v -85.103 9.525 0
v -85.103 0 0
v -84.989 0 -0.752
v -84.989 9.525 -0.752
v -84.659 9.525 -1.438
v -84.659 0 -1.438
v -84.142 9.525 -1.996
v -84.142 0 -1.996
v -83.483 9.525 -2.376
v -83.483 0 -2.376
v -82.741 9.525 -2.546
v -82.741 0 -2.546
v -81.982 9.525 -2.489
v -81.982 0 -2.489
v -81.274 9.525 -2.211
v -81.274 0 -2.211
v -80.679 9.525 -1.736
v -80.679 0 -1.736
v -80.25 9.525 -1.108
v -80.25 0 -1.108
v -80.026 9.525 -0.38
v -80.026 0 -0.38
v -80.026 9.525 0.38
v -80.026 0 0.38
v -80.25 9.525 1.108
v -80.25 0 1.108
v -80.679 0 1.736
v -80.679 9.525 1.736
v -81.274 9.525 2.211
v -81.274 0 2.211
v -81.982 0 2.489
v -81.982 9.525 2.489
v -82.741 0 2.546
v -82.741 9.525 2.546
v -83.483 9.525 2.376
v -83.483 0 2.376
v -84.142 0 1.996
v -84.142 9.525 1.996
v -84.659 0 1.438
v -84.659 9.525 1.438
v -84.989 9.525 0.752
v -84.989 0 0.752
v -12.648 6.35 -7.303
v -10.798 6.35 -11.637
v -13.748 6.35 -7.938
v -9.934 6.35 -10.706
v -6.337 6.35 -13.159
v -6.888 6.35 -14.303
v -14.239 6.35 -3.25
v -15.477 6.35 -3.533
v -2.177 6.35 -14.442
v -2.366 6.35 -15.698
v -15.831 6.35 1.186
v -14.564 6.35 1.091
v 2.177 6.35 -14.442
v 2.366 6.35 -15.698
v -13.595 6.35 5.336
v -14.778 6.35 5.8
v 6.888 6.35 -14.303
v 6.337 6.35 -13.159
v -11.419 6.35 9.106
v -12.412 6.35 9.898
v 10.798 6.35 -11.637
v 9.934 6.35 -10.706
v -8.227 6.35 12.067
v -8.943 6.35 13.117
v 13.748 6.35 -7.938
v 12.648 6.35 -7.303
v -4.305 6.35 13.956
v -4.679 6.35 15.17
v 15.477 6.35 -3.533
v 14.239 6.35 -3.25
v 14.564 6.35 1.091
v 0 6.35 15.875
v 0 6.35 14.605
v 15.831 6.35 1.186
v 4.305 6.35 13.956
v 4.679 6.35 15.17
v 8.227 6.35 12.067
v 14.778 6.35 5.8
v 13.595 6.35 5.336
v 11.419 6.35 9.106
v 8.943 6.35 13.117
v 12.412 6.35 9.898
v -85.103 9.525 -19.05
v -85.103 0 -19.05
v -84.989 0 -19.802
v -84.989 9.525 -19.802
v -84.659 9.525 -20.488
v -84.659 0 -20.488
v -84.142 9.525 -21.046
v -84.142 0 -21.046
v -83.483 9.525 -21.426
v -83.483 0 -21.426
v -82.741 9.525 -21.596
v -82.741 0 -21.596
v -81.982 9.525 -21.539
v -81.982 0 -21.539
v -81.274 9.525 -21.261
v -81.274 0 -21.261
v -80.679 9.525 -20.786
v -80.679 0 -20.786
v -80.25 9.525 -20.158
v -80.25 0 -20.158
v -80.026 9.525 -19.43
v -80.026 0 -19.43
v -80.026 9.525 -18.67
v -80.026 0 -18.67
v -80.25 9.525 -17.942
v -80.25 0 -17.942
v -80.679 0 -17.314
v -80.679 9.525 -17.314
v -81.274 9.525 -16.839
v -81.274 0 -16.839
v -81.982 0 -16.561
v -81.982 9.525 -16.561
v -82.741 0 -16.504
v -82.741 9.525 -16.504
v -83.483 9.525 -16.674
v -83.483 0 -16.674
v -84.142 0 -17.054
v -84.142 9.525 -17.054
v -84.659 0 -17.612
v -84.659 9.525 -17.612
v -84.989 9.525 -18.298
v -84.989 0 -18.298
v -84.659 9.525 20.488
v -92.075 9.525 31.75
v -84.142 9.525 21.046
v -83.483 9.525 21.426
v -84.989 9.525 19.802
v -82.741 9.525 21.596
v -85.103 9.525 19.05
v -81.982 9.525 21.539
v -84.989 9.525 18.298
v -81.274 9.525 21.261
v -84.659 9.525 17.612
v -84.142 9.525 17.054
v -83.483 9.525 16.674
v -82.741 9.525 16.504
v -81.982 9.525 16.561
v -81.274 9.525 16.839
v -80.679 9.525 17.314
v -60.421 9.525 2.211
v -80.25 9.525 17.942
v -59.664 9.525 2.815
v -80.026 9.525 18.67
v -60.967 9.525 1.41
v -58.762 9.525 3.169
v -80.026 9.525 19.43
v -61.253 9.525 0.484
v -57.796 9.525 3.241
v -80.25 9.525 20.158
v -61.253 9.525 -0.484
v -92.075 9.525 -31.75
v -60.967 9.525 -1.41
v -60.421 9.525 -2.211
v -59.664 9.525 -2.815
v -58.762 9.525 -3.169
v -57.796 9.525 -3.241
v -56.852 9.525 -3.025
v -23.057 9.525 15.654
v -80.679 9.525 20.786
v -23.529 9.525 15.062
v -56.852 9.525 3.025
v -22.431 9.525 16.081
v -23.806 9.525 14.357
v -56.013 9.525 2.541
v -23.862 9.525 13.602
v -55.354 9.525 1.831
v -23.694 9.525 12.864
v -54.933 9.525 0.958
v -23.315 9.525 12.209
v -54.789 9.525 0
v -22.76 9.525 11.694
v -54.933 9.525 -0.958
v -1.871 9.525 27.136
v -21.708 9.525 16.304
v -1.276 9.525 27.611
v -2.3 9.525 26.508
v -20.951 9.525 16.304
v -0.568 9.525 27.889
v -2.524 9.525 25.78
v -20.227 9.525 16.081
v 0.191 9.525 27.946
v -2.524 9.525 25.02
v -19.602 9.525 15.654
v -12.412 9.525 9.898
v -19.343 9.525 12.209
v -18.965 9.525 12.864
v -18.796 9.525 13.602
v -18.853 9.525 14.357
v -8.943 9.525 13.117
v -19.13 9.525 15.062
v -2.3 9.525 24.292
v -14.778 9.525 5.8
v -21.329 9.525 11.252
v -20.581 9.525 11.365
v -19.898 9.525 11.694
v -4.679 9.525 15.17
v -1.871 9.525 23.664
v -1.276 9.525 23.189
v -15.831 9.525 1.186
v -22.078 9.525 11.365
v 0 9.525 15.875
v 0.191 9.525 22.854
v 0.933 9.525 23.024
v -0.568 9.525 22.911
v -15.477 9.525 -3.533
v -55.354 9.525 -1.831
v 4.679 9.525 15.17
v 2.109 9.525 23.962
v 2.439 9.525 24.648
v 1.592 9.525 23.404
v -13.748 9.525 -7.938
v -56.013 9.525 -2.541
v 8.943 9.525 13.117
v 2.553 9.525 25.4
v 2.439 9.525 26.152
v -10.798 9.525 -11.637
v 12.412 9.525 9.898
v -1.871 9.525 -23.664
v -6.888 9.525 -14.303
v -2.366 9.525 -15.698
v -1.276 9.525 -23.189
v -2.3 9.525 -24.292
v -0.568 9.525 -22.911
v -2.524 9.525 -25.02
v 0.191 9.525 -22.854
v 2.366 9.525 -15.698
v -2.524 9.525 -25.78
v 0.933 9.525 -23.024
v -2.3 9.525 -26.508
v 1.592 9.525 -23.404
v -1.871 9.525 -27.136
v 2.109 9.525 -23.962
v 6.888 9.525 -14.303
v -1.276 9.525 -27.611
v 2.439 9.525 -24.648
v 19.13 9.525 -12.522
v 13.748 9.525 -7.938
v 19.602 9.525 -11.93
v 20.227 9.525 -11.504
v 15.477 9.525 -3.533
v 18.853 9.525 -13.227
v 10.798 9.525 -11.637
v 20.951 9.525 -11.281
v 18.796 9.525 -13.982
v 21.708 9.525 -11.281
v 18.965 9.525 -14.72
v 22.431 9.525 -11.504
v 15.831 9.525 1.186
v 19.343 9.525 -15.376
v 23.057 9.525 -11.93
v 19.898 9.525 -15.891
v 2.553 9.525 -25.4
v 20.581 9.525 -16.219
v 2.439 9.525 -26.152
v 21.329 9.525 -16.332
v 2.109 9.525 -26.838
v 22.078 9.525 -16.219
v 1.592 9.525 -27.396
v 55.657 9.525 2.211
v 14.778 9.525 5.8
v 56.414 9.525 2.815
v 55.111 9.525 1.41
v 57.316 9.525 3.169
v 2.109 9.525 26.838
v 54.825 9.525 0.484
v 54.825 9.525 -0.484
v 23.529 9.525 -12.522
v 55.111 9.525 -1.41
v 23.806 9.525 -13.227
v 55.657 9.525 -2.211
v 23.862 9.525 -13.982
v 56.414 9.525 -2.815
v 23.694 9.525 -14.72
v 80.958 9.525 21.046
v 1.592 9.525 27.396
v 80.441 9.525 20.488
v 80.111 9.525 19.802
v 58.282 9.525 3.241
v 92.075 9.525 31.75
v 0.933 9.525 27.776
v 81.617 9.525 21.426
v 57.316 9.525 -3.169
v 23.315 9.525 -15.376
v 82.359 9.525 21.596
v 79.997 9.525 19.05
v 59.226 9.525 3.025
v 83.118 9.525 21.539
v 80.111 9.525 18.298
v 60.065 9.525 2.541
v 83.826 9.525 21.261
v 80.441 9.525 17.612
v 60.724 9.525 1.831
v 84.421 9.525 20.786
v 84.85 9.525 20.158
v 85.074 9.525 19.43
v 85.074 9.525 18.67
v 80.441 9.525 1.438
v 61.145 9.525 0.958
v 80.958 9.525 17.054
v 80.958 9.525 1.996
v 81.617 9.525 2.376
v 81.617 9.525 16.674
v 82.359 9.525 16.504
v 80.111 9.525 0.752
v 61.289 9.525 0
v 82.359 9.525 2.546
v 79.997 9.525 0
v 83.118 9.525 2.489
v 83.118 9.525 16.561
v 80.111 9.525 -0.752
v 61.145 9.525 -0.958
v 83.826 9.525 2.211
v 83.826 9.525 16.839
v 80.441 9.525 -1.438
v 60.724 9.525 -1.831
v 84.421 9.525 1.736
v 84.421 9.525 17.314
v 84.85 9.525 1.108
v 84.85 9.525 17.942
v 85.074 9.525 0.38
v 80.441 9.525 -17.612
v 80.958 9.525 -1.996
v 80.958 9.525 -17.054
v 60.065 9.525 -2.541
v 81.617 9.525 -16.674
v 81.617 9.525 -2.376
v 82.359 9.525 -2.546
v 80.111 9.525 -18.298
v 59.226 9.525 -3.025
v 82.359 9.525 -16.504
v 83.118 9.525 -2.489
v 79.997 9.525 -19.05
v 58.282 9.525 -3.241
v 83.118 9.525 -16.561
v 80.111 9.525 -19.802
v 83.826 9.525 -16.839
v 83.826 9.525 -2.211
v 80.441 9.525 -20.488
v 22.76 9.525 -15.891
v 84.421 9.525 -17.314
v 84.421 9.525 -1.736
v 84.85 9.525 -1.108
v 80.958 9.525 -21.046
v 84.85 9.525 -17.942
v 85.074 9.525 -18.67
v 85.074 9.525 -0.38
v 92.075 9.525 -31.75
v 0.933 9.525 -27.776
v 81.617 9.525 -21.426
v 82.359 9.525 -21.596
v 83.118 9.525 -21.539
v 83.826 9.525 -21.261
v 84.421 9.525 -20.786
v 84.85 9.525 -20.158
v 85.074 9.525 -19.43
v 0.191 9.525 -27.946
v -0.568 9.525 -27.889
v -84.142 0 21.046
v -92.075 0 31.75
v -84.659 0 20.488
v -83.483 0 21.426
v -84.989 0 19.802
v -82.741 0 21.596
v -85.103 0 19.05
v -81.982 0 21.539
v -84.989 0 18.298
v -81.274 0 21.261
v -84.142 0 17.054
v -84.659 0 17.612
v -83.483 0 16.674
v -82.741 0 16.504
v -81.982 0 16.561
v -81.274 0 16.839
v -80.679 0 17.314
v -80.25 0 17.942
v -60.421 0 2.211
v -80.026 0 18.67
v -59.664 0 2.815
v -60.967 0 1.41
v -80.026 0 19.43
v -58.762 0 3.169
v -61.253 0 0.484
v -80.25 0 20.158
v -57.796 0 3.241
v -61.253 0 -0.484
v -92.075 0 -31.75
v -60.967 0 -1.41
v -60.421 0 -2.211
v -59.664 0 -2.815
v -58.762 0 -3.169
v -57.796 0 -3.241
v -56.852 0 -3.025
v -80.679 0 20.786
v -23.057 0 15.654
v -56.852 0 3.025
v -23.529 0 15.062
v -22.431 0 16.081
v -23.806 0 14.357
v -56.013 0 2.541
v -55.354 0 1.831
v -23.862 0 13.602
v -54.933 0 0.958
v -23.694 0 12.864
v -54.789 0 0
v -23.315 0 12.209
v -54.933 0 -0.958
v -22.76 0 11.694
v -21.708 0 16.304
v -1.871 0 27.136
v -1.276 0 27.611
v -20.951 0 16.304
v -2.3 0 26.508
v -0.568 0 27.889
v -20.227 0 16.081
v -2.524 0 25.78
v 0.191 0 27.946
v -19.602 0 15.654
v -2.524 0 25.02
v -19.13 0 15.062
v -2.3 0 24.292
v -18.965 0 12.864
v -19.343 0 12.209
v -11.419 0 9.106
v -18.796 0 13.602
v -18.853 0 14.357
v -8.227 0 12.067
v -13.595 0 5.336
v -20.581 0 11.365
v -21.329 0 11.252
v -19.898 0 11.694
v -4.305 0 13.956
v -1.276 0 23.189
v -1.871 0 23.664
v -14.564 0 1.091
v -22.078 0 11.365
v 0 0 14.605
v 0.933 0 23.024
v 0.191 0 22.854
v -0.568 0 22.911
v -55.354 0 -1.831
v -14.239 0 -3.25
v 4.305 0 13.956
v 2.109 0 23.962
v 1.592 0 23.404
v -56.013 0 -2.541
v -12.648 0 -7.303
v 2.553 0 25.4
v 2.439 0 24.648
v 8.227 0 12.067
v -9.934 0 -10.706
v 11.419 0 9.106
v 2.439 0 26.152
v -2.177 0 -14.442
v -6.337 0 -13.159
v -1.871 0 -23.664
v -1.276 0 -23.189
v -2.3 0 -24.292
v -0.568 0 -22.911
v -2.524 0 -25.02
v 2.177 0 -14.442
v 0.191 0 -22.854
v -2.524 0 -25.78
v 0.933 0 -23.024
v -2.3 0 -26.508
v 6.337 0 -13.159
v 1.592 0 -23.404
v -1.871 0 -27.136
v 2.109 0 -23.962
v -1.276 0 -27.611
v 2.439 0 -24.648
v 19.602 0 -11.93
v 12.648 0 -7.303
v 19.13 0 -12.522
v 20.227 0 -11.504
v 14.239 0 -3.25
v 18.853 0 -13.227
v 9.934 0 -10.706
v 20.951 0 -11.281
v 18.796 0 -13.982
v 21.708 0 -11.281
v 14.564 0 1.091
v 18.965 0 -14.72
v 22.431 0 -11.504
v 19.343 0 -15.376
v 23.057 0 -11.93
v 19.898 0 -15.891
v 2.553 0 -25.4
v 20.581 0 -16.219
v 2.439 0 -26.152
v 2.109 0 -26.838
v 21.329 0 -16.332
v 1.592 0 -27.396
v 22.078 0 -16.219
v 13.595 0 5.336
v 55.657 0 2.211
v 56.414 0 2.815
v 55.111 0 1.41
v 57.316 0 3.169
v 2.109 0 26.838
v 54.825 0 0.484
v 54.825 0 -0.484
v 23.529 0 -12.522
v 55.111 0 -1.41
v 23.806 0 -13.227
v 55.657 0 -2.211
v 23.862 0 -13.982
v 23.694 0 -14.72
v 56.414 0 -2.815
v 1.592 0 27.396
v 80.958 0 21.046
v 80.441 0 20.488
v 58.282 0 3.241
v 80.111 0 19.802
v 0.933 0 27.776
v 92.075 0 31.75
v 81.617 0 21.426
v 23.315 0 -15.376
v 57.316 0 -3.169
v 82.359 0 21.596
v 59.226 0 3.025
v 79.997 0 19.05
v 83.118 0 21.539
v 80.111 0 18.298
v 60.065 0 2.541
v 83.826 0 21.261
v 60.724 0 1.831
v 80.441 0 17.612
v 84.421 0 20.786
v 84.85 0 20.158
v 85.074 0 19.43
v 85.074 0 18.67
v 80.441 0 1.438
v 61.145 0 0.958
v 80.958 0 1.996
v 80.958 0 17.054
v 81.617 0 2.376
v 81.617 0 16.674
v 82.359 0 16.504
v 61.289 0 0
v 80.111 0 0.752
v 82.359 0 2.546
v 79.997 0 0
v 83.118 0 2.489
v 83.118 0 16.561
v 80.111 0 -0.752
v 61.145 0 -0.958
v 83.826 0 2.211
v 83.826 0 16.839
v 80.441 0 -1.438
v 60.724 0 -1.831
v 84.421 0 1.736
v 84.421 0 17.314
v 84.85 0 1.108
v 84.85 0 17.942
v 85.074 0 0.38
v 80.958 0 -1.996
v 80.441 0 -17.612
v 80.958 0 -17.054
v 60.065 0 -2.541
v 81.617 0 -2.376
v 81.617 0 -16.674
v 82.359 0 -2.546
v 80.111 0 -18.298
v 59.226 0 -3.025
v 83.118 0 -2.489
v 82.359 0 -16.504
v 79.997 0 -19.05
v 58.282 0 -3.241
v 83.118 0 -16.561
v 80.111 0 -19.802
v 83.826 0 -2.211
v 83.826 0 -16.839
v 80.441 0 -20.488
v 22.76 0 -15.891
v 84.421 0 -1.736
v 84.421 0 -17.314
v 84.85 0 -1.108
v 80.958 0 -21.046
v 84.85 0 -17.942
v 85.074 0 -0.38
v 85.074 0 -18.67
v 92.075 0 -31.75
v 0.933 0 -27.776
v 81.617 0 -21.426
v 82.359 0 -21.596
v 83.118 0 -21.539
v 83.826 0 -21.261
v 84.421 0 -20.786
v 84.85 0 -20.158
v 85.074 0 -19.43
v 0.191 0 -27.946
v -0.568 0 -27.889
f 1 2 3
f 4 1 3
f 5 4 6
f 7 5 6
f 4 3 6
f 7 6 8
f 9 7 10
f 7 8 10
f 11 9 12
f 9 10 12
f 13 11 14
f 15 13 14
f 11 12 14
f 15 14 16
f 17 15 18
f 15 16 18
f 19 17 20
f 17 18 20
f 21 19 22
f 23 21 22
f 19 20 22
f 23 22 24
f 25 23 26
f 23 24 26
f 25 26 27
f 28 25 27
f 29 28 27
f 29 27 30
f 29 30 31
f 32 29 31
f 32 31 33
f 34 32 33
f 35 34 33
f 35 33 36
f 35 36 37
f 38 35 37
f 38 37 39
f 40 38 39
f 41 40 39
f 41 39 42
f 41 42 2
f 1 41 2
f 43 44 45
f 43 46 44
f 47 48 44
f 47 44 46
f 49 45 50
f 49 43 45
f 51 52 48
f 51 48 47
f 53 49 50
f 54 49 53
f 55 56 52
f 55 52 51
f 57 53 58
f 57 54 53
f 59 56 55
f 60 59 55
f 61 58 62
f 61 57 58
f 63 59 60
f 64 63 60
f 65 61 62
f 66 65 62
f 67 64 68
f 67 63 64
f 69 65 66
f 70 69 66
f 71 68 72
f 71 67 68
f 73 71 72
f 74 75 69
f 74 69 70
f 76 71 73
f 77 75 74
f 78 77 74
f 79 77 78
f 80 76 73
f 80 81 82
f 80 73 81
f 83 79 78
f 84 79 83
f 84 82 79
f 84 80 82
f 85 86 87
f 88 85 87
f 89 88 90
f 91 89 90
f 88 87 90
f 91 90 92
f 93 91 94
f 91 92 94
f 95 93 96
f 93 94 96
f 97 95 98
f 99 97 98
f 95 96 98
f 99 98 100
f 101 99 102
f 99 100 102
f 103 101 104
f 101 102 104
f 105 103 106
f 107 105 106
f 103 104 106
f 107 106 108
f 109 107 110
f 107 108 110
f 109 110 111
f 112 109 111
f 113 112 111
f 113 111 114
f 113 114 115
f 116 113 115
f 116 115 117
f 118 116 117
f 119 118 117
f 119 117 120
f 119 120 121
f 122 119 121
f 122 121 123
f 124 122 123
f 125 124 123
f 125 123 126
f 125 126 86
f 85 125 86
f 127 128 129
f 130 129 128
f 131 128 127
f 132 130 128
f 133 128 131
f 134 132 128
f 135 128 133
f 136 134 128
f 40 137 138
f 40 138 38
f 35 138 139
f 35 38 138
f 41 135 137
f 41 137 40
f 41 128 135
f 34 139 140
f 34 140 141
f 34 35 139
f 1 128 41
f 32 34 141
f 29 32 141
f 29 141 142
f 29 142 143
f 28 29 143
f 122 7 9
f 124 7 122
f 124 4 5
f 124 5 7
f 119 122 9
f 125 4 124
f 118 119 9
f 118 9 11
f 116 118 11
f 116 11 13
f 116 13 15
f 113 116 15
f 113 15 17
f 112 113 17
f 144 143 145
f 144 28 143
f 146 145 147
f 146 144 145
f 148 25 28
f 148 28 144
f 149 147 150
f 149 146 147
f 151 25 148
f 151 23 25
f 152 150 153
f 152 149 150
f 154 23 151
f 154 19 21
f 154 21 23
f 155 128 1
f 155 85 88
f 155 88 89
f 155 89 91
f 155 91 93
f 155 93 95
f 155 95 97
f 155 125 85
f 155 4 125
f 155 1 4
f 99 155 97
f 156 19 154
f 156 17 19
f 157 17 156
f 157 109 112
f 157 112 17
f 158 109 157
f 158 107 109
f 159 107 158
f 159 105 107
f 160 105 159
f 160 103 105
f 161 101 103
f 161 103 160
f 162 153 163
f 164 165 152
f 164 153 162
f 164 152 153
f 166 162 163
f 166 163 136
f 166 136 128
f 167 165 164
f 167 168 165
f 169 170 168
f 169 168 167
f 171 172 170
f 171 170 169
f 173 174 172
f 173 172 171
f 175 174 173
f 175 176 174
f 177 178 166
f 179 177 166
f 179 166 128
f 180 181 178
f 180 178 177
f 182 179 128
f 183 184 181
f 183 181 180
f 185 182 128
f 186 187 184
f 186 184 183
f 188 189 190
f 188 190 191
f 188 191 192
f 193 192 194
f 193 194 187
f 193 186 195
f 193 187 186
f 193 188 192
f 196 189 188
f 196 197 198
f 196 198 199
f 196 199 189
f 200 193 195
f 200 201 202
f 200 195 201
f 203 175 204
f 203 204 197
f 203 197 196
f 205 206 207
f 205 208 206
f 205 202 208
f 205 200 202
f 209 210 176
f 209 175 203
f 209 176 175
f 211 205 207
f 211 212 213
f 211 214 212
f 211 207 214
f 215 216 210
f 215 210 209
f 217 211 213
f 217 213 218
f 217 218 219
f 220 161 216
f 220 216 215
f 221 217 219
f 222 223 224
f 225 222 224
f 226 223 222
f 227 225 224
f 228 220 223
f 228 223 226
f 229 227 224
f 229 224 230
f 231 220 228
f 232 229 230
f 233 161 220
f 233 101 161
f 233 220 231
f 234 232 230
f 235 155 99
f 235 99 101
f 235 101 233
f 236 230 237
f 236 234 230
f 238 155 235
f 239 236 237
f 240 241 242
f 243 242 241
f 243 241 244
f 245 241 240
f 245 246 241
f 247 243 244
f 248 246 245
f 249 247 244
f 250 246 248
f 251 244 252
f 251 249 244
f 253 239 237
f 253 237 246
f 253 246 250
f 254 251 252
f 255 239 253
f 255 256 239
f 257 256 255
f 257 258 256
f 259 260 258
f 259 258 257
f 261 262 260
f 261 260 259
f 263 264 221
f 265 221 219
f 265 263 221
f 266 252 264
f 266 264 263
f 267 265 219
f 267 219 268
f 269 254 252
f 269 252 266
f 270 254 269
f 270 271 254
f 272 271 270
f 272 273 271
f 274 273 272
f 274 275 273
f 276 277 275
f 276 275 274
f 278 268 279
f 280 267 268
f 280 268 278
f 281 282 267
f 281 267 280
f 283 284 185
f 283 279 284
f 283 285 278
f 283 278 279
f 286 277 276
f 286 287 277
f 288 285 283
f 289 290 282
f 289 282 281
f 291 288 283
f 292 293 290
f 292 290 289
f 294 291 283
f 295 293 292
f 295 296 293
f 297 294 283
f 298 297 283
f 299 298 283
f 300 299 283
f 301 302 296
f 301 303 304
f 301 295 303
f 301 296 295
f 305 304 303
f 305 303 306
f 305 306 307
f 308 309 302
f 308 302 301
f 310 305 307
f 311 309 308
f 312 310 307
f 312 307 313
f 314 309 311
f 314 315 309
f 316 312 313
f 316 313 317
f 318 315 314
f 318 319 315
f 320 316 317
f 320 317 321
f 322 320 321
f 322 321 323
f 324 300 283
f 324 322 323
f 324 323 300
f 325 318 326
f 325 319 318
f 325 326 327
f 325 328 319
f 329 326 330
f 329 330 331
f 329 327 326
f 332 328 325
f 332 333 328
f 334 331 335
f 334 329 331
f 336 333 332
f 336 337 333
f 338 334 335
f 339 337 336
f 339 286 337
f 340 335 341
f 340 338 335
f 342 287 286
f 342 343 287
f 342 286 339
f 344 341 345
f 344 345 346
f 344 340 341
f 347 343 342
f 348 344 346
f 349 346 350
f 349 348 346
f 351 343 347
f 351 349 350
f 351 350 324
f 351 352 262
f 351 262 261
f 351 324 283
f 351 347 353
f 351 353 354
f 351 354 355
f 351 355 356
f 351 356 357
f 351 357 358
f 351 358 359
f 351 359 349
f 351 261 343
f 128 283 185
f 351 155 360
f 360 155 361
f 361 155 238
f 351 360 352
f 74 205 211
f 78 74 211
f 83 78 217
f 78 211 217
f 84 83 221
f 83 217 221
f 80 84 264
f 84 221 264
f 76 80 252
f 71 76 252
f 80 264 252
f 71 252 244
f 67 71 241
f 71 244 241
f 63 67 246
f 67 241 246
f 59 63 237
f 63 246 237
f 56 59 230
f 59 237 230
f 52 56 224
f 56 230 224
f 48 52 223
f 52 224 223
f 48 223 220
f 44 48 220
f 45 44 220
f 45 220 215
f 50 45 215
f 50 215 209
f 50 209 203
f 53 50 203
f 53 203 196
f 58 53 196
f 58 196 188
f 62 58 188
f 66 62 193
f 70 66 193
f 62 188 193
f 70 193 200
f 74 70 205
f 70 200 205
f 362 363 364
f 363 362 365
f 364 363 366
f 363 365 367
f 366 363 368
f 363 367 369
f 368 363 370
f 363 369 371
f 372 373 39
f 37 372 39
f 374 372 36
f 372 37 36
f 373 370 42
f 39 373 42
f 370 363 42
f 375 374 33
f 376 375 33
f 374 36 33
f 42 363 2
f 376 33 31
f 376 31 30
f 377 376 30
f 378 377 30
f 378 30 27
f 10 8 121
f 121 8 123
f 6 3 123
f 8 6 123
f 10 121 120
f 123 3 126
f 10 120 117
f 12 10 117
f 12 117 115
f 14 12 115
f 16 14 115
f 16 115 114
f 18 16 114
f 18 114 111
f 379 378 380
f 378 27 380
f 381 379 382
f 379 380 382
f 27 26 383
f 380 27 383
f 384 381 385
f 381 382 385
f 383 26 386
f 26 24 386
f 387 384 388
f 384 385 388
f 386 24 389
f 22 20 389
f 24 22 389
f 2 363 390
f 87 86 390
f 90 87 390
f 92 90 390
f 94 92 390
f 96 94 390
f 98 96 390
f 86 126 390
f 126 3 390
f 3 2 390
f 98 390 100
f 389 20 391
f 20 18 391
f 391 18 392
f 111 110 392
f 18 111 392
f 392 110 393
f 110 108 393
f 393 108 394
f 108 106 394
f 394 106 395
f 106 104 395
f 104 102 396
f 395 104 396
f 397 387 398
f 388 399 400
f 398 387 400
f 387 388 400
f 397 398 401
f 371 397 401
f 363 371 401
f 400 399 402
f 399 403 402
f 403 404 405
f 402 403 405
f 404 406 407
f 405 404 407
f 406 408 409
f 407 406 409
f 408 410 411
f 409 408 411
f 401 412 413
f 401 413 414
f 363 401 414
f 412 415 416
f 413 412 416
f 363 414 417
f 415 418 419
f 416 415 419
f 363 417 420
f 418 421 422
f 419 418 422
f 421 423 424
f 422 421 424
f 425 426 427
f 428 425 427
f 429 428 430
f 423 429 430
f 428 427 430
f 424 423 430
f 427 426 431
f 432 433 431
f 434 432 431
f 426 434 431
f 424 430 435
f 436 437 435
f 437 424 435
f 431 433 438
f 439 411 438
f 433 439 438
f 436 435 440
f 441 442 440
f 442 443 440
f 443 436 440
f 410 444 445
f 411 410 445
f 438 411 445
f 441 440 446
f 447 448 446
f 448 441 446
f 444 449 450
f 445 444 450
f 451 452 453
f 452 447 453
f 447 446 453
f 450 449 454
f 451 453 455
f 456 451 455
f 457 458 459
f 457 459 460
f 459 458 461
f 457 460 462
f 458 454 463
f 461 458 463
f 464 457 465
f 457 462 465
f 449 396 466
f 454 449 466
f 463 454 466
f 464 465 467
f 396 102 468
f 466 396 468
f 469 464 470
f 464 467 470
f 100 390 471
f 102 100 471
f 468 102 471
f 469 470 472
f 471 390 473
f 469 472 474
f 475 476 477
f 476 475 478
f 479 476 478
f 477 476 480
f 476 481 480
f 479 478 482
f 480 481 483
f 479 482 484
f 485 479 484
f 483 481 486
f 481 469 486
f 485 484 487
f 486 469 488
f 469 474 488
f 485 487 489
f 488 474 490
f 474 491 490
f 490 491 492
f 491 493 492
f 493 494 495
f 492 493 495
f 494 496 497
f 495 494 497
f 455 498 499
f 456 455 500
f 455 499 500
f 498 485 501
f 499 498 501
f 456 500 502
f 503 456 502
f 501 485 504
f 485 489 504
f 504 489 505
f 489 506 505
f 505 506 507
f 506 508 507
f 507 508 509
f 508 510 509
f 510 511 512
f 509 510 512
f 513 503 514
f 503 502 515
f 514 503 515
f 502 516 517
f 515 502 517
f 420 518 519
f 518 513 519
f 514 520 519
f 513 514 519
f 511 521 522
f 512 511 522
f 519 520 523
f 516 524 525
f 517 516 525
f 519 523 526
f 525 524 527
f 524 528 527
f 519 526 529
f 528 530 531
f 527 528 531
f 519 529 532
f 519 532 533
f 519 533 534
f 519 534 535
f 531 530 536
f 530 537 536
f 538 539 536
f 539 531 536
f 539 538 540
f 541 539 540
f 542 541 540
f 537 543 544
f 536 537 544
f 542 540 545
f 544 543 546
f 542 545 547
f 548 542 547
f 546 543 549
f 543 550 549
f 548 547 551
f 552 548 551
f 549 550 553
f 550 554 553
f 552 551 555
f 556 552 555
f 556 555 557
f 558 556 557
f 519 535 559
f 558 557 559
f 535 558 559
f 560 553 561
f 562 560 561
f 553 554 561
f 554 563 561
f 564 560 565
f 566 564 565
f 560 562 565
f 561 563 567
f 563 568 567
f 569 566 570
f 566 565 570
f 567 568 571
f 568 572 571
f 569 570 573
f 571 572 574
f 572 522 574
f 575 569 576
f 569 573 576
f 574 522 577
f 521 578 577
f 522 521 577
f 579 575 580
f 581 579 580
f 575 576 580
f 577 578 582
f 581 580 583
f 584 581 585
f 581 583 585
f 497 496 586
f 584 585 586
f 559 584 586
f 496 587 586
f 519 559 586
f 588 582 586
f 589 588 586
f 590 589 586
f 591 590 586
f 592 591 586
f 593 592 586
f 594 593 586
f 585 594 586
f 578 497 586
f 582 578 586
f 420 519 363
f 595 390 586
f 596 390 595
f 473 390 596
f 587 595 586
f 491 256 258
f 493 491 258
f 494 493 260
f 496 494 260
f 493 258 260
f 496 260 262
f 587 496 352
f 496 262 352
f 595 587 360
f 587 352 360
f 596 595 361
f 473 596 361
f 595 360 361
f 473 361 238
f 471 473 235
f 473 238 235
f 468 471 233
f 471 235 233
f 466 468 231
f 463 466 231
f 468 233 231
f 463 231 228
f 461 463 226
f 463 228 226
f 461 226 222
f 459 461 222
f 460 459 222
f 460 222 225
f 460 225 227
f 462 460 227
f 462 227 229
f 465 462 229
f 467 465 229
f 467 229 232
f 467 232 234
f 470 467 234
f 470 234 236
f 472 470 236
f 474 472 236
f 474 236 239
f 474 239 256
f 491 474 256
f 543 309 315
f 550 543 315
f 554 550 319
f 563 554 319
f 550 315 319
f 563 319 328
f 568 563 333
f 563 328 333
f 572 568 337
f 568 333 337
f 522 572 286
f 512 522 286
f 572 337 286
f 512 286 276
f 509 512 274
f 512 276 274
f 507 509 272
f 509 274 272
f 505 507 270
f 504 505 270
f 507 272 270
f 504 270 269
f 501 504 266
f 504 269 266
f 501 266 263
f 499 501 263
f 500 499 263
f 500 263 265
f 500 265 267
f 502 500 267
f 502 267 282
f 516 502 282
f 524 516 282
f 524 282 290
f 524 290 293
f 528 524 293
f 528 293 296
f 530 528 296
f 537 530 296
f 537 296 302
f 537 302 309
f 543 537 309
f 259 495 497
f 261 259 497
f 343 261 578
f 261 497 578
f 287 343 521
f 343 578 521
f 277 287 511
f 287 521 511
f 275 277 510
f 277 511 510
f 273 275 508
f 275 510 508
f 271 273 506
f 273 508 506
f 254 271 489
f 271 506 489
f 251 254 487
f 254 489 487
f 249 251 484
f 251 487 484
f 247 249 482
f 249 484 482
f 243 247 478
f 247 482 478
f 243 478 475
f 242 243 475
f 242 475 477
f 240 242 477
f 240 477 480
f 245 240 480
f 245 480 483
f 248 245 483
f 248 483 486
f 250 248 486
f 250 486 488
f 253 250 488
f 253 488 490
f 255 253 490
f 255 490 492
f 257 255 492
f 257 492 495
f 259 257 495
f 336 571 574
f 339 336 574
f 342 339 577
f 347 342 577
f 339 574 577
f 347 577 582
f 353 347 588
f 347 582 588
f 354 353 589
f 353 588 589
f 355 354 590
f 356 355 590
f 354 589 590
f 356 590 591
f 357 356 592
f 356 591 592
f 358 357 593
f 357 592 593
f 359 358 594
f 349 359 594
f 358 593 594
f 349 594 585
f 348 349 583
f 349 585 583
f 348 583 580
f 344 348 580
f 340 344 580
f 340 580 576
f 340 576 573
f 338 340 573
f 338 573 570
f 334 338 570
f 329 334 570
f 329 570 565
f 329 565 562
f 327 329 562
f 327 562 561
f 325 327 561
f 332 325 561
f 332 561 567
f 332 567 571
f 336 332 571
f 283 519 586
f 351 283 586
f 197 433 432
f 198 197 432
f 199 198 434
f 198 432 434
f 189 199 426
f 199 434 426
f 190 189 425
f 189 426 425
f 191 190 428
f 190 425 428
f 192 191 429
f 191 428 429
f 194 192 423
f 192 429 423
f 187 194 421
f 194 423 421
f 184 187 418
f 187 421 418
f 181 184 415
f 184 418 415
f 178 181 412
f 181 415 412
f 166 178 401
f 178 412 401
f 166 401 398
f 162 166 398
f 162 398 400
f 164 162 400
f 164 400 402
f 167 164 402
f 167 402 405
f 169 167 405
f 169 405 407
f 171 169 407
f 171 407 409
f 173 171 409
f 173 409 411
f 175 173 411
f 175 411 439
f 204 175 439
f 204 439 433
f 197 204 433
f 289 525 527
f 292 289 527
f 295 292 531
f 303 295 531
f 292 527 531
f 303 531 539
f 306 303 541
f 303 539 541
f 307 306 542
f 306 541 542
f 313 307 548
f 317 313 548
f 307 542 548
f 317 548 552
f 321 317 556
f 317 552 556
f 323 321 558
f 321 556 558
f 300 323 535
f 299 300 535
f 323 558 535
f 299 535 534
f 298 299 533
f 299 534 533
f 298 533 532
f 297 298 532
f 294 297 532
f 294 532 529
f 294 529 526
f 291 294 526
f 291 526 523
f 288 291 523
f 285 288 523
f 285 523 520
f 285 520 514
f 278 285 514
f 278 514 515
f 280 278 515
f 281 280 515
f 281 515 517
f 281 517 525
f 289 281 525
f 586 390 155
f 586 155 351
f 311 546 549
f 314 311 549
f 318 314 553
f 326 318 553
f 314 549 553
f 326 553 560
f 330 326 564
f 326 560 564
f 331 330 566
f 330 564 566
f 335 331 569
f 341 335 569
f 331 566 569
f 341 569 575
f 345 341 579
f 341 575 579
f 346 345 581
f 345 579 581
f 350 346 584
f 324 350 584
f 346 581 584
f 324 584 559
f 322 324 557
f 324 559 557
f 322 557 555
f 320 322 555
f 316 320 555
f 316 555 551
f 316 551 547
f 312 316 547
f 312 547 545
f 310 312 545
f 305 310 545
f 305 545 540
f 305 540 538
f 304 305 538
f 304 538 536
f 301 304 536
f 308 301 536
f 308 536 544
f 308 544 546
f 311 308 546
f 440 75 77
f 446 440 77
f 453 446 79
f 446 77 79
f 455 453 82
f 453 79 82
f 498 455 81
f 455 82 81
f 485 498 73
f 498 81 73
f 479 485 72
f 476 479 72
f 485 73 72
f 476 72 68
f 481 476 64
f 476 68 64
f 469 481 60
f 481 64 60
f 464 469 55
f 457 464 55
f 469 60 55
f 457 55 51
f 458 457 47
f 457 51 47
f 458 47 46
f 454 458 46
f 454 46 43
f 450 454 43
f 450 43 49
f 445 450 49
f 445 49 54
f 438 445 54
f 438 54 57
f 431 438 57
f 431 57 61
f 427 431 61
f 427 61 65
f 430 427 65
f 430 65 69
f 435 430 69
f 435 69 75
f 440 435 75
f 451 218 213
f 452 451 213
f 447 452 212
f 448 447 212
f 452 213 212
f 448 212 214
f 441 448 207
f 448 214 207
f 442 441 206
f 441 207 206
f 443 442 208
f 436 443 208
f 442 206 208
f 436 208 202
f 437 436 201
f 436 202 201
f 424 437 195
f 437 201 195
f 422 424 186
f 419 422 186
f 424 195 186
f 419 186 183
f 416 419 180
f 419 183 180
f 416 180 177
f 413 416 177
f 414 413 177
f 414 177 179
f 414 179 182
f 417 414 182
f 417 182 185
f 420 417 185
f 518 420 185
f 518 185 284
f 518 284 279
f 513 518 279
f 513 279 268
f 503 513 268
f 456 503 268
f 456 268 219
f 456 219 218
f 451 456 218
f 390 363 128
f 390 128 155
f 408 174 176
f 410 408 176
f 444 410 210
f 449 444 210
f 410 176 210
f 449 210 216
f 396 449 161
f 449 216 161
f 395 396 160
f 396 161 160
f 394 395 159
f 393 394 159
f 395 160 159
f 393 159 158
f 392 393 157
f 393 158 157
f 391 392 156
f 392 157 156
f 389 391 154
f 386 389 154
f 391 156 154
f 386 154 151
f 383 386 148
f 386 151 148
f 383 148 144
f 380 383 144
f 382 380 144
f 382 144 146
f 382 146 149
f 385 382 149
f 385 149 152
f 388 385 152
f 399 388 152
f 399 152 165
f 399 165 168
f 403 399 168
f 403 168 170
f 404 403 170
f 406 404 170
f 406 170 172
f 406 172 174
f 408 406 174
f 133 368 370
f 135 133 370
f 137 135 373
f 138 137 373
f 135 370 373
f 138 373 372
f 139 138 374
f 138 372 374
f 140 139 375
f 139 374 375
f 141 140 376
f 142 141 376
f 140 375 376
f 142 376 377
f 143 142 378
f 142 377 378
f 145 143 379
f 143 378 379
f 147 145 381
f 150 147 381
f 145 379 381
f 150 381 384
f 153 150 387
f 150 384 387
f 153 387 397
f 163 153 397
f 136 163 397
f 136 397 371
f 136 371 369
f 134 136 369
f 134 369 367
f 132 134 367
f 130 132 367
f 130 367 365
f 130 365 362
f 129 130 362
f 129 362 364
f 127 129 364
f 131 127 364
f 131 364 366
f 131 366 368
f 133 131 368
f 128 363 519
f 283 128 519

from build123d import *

# Parameters (mm, degrees)
SKETCH1_W                  = 184.15
SKETCH1_H                  = 63.5
BOSS_EXTRUDE1_DEPTH        = 9.525
SKETCH3_R                  = 14.605
CUT_EXTRUDE1_DEPTH         = 98.860072297
F_10_CLEARANCE_HOLE1_D     = 5.1054
F_6_5_6_5_DIAMETER_HOLE3_D = 6.5
SKETCH29_R                 = 15.875
CUT_EXTRUDE5_DEPTH         = 3.175
F_10_CLEARANCE_HOLE2_D     = 5.1054
SKETCH36_R                 = 2.54
CUT_EXTRUDE6_DEPTH         = 98.860072297


with BuildPart() as part:
    # Sketch1 → Boss-Extrude1 (new body)
    with BuildSketch(Plane(origin=(0, 0, 0), x_dir=(1, 0, 0), z_dir=(0, 1, 0))):
        Rectangle(SKETCH1_W, SKETCH1_H)
    extrude(amount=BOSS_EXTRUDE1_DEPTH)

    # Sketch3 → Cut-Extrude1 (cut, through all)
    with BuildSketch(Plane(origin=(0, 9.525, 0), x_dir=(1, 0, 0), z_dir=(0, 1, 0))):
        with Locations(Location((0, 0, 0), (0, 0, 270))):
            Circle(SKETCH3_R)
    extrude(amount=-CUT_EXTRUDE1_DEPTH, mode=Mode.SUBTRACT)

    # #10 Clearance Hole1 (through all)
    with Locations(Plane(origin=(0, 0, 0), x_dir=(-1, 0, 0), z_dir=(0, -1, 0))):
        with Locations((0, -25.4), (0, 25.4)):
            Hole(F_10_CLEARANCE_HOLE1_D / 2)

    # Ø6.5 (6.5) Diameter Hole3 (through all)
    with Locations(Plane(origin=(0, 0, 0), x_dir=(-1, 0, 0), z_dir=(0, -1, 0))):
        with Locations((58.039, 0), (-58.039, 0)):
            Hole(F_6_5_6_5_DIAMETER_HOLE3_D / 2)

    # Sketch29 → Cut-Extrude5 (cut)
    with BuildSketch(Plane(origin=(0, 9.525, 0), x_dir=(1, 0, 0), z_dir=(0, 1, 0))):
        with Locations(Location((0, 0, 0), (0, 0, 270))):
            Circle(SKETCH29_R)
    extrude(amount=-CUT_EXTRUDE5_DEPTH, mode=Mode.SUBTRACT)

    # #10 Clearance Hole2 (through all)
    with Locations(Plane(origin=(0, 9.525, 0), x_dir=(1, 0, 0), z_dir=(0, 1, 0))):
        with Locations((-82.55, 19.05), (-82.55, -19.05), (82.55, -19.05), (82.55, 19.05), (-82.55, 0), (82.55, 0)):
            Hole(F_10_CLEARANCE_HOLE2_D / 2)

    # Sketch36 → Cut-Extrude6 (cut, through all)
    with BuildSketch(Plane.XZ):
        with Locations(Location((-21.329210467, 13.7922, 0), (0, 0, 270))):
            Circle(SKETCH36_R)
        with Locations(Location((21.329210467, -13.7922, 0), (0, 0, 270))):
            Circle(SKETCH36_R)
    extrude(amount=-CUT_EXTRUDE6_DEPTH, mode=Mode.SUBTRACT)


solid = part.part
